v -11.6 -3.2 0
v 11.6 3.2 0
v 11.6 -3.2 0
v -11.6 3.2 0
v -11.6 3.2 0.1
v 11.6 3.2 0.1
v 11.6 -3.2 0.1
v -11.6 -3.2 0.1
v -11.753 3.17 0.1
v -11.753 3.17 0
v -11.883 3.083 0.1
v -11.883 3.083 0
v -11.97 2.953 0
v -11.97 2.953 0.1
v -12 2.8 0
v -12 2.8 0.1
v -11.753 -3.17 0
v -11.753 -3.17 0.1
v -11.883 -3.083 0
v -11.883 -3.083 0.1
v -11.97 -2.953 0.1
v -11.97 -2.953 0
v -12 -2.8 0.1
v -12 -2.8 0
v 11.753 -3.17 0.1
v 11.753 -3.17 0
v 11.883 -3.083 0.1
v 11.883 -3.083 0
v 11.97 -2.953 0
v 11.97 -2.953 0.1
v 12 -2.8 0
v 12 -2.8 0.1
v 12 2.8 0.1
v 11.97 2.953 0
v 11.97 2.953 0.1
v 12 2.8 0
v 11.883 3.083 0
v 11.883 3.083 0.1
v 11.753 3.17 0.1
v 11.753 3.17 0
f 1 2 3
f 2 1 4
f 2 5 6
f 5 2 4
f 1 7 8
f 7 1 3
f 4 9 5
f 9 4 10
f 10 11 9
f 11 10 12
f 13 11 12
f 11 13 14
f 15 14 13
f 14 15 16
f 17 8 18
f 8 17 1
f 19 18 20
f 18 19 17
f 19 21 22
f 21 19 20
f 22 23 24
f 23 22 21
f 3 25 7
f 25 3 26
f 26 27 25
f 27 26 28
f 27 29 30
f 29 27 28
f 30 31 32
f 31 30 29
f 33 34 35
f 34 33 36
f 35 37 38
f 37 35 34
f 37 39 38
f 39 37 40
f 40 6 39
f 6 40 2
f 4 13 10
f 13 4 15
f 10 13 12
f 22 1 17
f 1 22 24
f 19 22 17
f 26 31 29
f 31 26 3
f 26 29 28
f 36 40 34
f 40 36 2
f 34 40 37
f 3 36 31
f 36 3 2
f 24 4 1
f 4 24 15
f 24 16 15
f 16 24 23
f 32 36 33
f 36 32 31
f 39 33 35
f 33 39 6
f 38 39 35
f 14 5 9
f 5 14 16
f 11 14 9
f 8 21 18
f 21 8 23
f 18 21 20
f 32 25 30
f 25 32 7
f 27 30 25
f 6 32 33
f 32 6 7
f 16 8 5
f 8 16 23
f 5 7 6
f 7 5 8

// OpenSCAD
// file: ../p/box3u12.scad
use <../lib.scad>
function ldraw_lib__box3u12() = [
// 0 Box with 3 Parallel Faces without Any Edges
// 0 Name: box3u12.dat
// 0 Author: J.C. Tchang [tchang]
// 0 !LDRAW_ORG Primitive UPDATE 2014-02
// 0 !LICENSE Licensed under CC BY 2.0 and CC BY 4.0 : see CAreadme.txt
// 
// 0 BFC CERTIFY CCW
  [0,"BFC","CERTIFY"],
  [0,"BFC","CCW"],
// 
// 0 !HISTORY 2014-12-23 [PTadmin] Official Update 2014-02
// 
// 
// 4 16 -1 1 1 1 1 1 1 1 -1 -1 1 -1
  [4,16,-1,1,1,1,1,1,1,1,-1,-1,1,-1],
// 4 16 -1 1 1 -1 0 1 1 0 1 1 1 1
  [4,16,-1,1,1,-1,0,1,1,0,1,1,1,1],
// 4 16 1 1 -1 1 0 -1 -1 0 -1 -1 1 -1
  [4,16,1,1,-1,1,0,-1,-1,0,-1,-1,1,-1],
];
makepoly(ldraw_lib__box3u12(), line=0.2);
// file: ../p/1-4cyli.scad
use <../lib.scad>
function ldraw_lib__1_4cyli() = [
// 0 Cylinder 0.25
// 0 Name: 1-4cyli.dat
// 0 Author: James Jessiman
// 0 !LDRAW_ORG Primitive UPDATE 2012-01
// 0 !LICENSE Licensed under CC BY 2.0 and CC BY 4.0 : see CAreadme.txt
// 
// 0 BFC CERTIFY CCW
  [0,"BFC","CERTIFY"],
  [0,"BFC","CCW"],
// 
// 0 !HISTORY 2002-03-23 [sbliss] Added BFC statement.
// 0 !HISTORY 2002-04-25 [PTadmin] Official Update 2002-02
// 0 !HISTORY 2007-06-22 [PTadmin] Header formatted for Contributor Agreement
// 0 !HISTORY 2008-07-01 [PTadmin] Official Update 2008-01
// 0 !HISTORY 2012-02-16 [Philo] Changed to CCW
// 0 !HISTORY 2012-03-30 [PTadmin] Official Update 2012-01
// 
// 
// 4 16 1 1 0 0.9239 1 0.3827 0.9239 0 0.3827 1 0 0
  [4,16,1,1,0,0.9239,1,0.3827,0.9239,0,0.3827,1,0,0],
// 5 24 1 0 0 1 1 0 0.9239 0 0.3827 1 0 -1
  [5,24,1,0,0,1,1,0,0.9239,0,0.3827,1,0,-1],
// 4 16 0.9239 1 0.3827 0.7071 1 0.7071 0.7071 0 0.7071 0.9239 0 0.3827
  [4,16,0.9239,1,0.3827,0.7071,1,0.7071,0.7071,0,0.7071,0.9239,0,0.3827],
// 5 24 0.9239 0 0.3827 0.9239 1 0.3827 0.7071 0 0.7071 1 0 0
  [5,24,0.9239,0,0.3827,0.9239,1,0.3827,0.7071,0,0.7071,1,0,0],
// 4 16 0.7071 1 0.7071 0.3827 1 0.9239 0.3827 0 0.9239 0.7071 0 0.7071
  [4,16,0.7071,1,0.7071,0.3827,1,0.9239,0.3827,0,0.9239,0.7071,0,0.7071],
// 5 24 0.7071 0 0.7071 0.7071 1 0.7071 0.3827 0 0.9239 0.9239 0 0.3827
  [5,24,0.7071,0,0.7071,0.7071,1,0.7071,0.3827,0,0.9239,0.9239,0,0.3827],
// 4 16 0.3827 1 0.9239 0 1 1 0 0 1 0.3827 0 0.9239
  [4,16,0.3827,1,0.9239,0,1,1,0,0,1,0.3827,0,0.9239],
// 5 24 0.3827 0 0.9239 0.3827 1 0.9239 0 0 1 0.7071 0 0.7071
  [5,24,0.3827,0,0.9239,0.3827,1,0.9239,0,0,1,0.7071,0,0.7071],
// 5 24 0 0 1 0 1 1 0.3827 0 0.9239 -1 0 1
  [5,24,0,0,1,0,1,1,0.3827,0,0.9239,-1,0,1],
];
makepoly(ldraw_lib__1_4cyli(), line=0.2);
// file: s/4111899hs02.scad
use <../../lib.scad>
use <../../p/1-4chrd.scad>
use <../../p/1-4cyli.scad>
use <../../p/box3u12.scad>
function ldraw_lib__s__4111899hs02() = [
// 0 ~Sticker  0.8 x  3 without Top Surface
// 0 Name: s\4111899hs02.dat
// 0 Author: Ulrich Röder [UR]
// 0 !LDRAW_ORG Subpart UPDATE 2020-03
// 0 !LICENSE Licensed under CC BY 2.0 and CC BY 4.0 : see CAreadme.txt
// 
// 0 BFC CERTIFY CCW
  [0,"BFC","CERTIFY"],
  [0,"BFC","CCW"],
// 
// 0 !HISTORY 2020-12-29 [PTadmin] Official Update 2020-03
// 
// 
// 1 16 0 -0.25 0 29 0 0 0 0.25 0 0 0 8 box3u12.dat
  [1,16,0,-0.25,0,29,0,0,0,0.25,0,0,0,8, ldraw_lib__box3u12()],
// 1 16 -29 0 7 0 0 -1 0 -.25 0 1 0 0 1-4cyli.dat
  [1,16,-29,0,7,0,0,-1,0,-.25,0,1,0,0, ldraw_lib__1_4cyli()],
// 1 16 -29 0 -7 0 0 -1 0 -.25 0 -1 0 0 1-4cyli.dat
  [1,16,-29,0,-7,0,0,-1,0,-.25,0,-1,0,0, ldraw_lib__1_4cyli()],
// 1 16 29 0 -7 0 0 1 0 -.25 0 -1 0 0 1-4cyli.dat
  [1,16,29,0,-7,0,0,1,0,-.25,0,-1,0,0, ldraw_lib__1_4cyli()],
// 1 16 29 0 7 1 0 0 0 -.25 0 0 0 1 1-4cyli.dat
  [1,16,29,0,7,1,0,0,0,-.25,0,0,0,1, ldraw_lib__1_4cyli()],
// 1 16 -29 0 7 0 0 -1 0 -1 0 1 0 0 1-4chrd.dat
  [1,16,-29,0,7,0,0,-1,0,-1,0,1,0,0, ldraw_lib__1_4chrd()],
// 1 16 -29 0 -7 0 0 -1 0 -1 0 -1 0 0 1-4chrd.dat
  [1,16,-29,0,-7,0,0,-1,0,-1,0,-1,0,0, ldraw_lib__1_4chrd()],
// 1 16 29 0 -7 0 0 1 0 -1 0 -1 0 0 1-4chrd.dat
  [1,16,29,0,-7,0,0,1,0,-1,0,-1,0,0, ldraw_lib__1_4chrd()],
// 1 16 29 0 7 1 0 0 0 -1 0 0 0 1 1-4chrd.dat
  [1,16,29,0,7,1,0,0,0,-1,0,0,0,1, ldraw_lib__1_4chrd()],
// 4 16 29 0 8 30 0 7 30 0 -7 29 0 -8
  [4,16,29,0,8,30,0,7,30,0,-7,29,0,-8],
// 4 16 -29 0 -8 -30 0 -7 -30 0 7 -29 0 8
  [4,16,-29,0,-8,-30,0,-7,-30,0,7,-29,0,8],
// 4 16 -30 -.25 7 -30 0 7 -30 0 -7 -30 -.25 -7
  [4,16,-30,-.25,7,-30,0,7,-30,0,-7,-30,-.25,-7],
// 4 16 30 0 -7 30 0 7 30 -.25 7 30 -.25 -7
  [4,16,30,0,-7,30,0,7,30,-.25,7,30,-.25,-7],
];
makepoly(ldraw_lib__s__4111899hs02(), line=0.2);
// file: ../p/1-4chrd.scad
use <../lib.scad>
function ldraw_lib__1_4chrd() = [
// 0 Chord 0.25
// 0 Name: 1-4chrd.dat
// 0 Author: Tony Hafner [hafhead]
// 0 !LDRAW_ORG Primitive UPDATE 2012-02
// 0 !LICENSE Licensed under CC BY 2.0 and CC BY 4.0 : see CAreadme.txt
// 
// 0 BFC CERTIFY CCW
  [0,"BFC","CERTIFY"],
  [0,"BFC","CCW"],
// 
// 0 !HISTORY 2004-04-22 [PTadmin] Official Update 2004-02
// 0 !HISTORY 2007-10-09 [PTadmin] Header formatted for Contributor Agreement
// 0 !HISTORY 2008-07-01 [PTadmin] Official Update 2008-01
// 0 !HISTORY 2012-08-02 [MMR1988] Re-creation with PrimGen2 and Rectifier
// 0 !HISTORY 2012-08-09 [PTadmin] Official Update 2012-02
// 
// 
// 4 16 0.9239 0 0.3827 0.3827 0 0.9239 0 0 1 1 0 0
  [4,16,0.9239,0,0.3827,0.3827,0,0.9239,0,0,1,1,0,0],
// 3 16 0.7071 0 0.7071 0.3827 0 0.9239 0.9239 0 0.3827
  [3,16,0.7071,0,0.7071,0.3827,0,0.9239,0.9239,0,0.3827],
];
makepoly(ldraw_lib__1_4chrd(), line=0.2);
// main file
use <../lib.scad>
use <../p/1-4chrd.scad>
use <s/4111899hs02.scad>
function ldraw_lib__4111899g() = [
// 0 Sticker  0.8 x  3 Yellow
// 0 Name: 4111899g.dat
// 0 Author: Ulrich Röder [UR]
// 0 !LDRAW_ORG Part UPDATE 2020-03
// 0 !LICENSE Licensed under CC BY 2.0 and CC BY 4.0 : see CAreadme.txt
// 
// 0 BFC CERTIFY CCW
  [0,"BFC","CERTIFY"],
  [0,"BFC","CCW"],
// 
// 0 !KEYWORDS Black Thunder, helicopter, Set 5542
// 
// 0 !HISTORY 2020-12-29 [PTadmin] Official Update 2020-03
// 
// 
// 1 16 0 0 0 1 0 0 0 1 0 0 0 1 s\4111899hs02.dat
  [1,16,0,0,0,1,0,0,0,1,0,0,0,1, ldraw_lib__s__4111899hs02()],
// 
// 1 14 29 -.25 7 1 0 0 0 1 0 0 0 1 1-4chrd.dat
  [1,14,29,-.25,7,1,0,0,0,1,0,0,0,1, ldraw_lib__1_4chrd()],
// 1 14 -29 -.25 7 0 0 -1 0 1 0 1 0 0 1-4chrd.dat
  [1,14,-29,-.25,7,0,0,-1,0,1,0,1,0,0, ldraw_lib__1_4chrd()],
// 1 14 -29 -.25 -7 0 0 -1 0 1 0 -1 0 0 1-4chrd.dat
  [1,14,-29,-.25,-7,0,0,-1,0,1,0,-1,0,0, ldraw_lib__1_4chrd()],
// 1 14 29 -.25 -7 0 0 1 0 1 0 -1 0 0 1-4chrd.dat
  [1,14,29,-.25,-7,0,0,1,0,1,0,-1,0,0, ldraw_lib__1_4chrd()],
// 4 14 30 -.25 -7 30 -.25 7 29 -.25 8 29 -.25 -8
  [4,14,30,-.25,-7,30,-.25,7,29,-.25,8,29,-.25,-8],
// 4 14 -30 -.25 7 -30 -.25 -7 -29 -.25 -8 -29 -.25 8
  [4,14,-30,-.25,7,-30,-.25,-7,-29,-.25,-8,-29,-.25,8],
// 4 14 29 -.25 8 -29 -.25 8 -29 -.25 -8 29 -.25 -8
  [4,14,29,-.25,8,-29,-.25,8,-29,-.25,-8,29,-.25,-8],
];
makepoly(ldraw_lib__4111899g(), line=0.2);
